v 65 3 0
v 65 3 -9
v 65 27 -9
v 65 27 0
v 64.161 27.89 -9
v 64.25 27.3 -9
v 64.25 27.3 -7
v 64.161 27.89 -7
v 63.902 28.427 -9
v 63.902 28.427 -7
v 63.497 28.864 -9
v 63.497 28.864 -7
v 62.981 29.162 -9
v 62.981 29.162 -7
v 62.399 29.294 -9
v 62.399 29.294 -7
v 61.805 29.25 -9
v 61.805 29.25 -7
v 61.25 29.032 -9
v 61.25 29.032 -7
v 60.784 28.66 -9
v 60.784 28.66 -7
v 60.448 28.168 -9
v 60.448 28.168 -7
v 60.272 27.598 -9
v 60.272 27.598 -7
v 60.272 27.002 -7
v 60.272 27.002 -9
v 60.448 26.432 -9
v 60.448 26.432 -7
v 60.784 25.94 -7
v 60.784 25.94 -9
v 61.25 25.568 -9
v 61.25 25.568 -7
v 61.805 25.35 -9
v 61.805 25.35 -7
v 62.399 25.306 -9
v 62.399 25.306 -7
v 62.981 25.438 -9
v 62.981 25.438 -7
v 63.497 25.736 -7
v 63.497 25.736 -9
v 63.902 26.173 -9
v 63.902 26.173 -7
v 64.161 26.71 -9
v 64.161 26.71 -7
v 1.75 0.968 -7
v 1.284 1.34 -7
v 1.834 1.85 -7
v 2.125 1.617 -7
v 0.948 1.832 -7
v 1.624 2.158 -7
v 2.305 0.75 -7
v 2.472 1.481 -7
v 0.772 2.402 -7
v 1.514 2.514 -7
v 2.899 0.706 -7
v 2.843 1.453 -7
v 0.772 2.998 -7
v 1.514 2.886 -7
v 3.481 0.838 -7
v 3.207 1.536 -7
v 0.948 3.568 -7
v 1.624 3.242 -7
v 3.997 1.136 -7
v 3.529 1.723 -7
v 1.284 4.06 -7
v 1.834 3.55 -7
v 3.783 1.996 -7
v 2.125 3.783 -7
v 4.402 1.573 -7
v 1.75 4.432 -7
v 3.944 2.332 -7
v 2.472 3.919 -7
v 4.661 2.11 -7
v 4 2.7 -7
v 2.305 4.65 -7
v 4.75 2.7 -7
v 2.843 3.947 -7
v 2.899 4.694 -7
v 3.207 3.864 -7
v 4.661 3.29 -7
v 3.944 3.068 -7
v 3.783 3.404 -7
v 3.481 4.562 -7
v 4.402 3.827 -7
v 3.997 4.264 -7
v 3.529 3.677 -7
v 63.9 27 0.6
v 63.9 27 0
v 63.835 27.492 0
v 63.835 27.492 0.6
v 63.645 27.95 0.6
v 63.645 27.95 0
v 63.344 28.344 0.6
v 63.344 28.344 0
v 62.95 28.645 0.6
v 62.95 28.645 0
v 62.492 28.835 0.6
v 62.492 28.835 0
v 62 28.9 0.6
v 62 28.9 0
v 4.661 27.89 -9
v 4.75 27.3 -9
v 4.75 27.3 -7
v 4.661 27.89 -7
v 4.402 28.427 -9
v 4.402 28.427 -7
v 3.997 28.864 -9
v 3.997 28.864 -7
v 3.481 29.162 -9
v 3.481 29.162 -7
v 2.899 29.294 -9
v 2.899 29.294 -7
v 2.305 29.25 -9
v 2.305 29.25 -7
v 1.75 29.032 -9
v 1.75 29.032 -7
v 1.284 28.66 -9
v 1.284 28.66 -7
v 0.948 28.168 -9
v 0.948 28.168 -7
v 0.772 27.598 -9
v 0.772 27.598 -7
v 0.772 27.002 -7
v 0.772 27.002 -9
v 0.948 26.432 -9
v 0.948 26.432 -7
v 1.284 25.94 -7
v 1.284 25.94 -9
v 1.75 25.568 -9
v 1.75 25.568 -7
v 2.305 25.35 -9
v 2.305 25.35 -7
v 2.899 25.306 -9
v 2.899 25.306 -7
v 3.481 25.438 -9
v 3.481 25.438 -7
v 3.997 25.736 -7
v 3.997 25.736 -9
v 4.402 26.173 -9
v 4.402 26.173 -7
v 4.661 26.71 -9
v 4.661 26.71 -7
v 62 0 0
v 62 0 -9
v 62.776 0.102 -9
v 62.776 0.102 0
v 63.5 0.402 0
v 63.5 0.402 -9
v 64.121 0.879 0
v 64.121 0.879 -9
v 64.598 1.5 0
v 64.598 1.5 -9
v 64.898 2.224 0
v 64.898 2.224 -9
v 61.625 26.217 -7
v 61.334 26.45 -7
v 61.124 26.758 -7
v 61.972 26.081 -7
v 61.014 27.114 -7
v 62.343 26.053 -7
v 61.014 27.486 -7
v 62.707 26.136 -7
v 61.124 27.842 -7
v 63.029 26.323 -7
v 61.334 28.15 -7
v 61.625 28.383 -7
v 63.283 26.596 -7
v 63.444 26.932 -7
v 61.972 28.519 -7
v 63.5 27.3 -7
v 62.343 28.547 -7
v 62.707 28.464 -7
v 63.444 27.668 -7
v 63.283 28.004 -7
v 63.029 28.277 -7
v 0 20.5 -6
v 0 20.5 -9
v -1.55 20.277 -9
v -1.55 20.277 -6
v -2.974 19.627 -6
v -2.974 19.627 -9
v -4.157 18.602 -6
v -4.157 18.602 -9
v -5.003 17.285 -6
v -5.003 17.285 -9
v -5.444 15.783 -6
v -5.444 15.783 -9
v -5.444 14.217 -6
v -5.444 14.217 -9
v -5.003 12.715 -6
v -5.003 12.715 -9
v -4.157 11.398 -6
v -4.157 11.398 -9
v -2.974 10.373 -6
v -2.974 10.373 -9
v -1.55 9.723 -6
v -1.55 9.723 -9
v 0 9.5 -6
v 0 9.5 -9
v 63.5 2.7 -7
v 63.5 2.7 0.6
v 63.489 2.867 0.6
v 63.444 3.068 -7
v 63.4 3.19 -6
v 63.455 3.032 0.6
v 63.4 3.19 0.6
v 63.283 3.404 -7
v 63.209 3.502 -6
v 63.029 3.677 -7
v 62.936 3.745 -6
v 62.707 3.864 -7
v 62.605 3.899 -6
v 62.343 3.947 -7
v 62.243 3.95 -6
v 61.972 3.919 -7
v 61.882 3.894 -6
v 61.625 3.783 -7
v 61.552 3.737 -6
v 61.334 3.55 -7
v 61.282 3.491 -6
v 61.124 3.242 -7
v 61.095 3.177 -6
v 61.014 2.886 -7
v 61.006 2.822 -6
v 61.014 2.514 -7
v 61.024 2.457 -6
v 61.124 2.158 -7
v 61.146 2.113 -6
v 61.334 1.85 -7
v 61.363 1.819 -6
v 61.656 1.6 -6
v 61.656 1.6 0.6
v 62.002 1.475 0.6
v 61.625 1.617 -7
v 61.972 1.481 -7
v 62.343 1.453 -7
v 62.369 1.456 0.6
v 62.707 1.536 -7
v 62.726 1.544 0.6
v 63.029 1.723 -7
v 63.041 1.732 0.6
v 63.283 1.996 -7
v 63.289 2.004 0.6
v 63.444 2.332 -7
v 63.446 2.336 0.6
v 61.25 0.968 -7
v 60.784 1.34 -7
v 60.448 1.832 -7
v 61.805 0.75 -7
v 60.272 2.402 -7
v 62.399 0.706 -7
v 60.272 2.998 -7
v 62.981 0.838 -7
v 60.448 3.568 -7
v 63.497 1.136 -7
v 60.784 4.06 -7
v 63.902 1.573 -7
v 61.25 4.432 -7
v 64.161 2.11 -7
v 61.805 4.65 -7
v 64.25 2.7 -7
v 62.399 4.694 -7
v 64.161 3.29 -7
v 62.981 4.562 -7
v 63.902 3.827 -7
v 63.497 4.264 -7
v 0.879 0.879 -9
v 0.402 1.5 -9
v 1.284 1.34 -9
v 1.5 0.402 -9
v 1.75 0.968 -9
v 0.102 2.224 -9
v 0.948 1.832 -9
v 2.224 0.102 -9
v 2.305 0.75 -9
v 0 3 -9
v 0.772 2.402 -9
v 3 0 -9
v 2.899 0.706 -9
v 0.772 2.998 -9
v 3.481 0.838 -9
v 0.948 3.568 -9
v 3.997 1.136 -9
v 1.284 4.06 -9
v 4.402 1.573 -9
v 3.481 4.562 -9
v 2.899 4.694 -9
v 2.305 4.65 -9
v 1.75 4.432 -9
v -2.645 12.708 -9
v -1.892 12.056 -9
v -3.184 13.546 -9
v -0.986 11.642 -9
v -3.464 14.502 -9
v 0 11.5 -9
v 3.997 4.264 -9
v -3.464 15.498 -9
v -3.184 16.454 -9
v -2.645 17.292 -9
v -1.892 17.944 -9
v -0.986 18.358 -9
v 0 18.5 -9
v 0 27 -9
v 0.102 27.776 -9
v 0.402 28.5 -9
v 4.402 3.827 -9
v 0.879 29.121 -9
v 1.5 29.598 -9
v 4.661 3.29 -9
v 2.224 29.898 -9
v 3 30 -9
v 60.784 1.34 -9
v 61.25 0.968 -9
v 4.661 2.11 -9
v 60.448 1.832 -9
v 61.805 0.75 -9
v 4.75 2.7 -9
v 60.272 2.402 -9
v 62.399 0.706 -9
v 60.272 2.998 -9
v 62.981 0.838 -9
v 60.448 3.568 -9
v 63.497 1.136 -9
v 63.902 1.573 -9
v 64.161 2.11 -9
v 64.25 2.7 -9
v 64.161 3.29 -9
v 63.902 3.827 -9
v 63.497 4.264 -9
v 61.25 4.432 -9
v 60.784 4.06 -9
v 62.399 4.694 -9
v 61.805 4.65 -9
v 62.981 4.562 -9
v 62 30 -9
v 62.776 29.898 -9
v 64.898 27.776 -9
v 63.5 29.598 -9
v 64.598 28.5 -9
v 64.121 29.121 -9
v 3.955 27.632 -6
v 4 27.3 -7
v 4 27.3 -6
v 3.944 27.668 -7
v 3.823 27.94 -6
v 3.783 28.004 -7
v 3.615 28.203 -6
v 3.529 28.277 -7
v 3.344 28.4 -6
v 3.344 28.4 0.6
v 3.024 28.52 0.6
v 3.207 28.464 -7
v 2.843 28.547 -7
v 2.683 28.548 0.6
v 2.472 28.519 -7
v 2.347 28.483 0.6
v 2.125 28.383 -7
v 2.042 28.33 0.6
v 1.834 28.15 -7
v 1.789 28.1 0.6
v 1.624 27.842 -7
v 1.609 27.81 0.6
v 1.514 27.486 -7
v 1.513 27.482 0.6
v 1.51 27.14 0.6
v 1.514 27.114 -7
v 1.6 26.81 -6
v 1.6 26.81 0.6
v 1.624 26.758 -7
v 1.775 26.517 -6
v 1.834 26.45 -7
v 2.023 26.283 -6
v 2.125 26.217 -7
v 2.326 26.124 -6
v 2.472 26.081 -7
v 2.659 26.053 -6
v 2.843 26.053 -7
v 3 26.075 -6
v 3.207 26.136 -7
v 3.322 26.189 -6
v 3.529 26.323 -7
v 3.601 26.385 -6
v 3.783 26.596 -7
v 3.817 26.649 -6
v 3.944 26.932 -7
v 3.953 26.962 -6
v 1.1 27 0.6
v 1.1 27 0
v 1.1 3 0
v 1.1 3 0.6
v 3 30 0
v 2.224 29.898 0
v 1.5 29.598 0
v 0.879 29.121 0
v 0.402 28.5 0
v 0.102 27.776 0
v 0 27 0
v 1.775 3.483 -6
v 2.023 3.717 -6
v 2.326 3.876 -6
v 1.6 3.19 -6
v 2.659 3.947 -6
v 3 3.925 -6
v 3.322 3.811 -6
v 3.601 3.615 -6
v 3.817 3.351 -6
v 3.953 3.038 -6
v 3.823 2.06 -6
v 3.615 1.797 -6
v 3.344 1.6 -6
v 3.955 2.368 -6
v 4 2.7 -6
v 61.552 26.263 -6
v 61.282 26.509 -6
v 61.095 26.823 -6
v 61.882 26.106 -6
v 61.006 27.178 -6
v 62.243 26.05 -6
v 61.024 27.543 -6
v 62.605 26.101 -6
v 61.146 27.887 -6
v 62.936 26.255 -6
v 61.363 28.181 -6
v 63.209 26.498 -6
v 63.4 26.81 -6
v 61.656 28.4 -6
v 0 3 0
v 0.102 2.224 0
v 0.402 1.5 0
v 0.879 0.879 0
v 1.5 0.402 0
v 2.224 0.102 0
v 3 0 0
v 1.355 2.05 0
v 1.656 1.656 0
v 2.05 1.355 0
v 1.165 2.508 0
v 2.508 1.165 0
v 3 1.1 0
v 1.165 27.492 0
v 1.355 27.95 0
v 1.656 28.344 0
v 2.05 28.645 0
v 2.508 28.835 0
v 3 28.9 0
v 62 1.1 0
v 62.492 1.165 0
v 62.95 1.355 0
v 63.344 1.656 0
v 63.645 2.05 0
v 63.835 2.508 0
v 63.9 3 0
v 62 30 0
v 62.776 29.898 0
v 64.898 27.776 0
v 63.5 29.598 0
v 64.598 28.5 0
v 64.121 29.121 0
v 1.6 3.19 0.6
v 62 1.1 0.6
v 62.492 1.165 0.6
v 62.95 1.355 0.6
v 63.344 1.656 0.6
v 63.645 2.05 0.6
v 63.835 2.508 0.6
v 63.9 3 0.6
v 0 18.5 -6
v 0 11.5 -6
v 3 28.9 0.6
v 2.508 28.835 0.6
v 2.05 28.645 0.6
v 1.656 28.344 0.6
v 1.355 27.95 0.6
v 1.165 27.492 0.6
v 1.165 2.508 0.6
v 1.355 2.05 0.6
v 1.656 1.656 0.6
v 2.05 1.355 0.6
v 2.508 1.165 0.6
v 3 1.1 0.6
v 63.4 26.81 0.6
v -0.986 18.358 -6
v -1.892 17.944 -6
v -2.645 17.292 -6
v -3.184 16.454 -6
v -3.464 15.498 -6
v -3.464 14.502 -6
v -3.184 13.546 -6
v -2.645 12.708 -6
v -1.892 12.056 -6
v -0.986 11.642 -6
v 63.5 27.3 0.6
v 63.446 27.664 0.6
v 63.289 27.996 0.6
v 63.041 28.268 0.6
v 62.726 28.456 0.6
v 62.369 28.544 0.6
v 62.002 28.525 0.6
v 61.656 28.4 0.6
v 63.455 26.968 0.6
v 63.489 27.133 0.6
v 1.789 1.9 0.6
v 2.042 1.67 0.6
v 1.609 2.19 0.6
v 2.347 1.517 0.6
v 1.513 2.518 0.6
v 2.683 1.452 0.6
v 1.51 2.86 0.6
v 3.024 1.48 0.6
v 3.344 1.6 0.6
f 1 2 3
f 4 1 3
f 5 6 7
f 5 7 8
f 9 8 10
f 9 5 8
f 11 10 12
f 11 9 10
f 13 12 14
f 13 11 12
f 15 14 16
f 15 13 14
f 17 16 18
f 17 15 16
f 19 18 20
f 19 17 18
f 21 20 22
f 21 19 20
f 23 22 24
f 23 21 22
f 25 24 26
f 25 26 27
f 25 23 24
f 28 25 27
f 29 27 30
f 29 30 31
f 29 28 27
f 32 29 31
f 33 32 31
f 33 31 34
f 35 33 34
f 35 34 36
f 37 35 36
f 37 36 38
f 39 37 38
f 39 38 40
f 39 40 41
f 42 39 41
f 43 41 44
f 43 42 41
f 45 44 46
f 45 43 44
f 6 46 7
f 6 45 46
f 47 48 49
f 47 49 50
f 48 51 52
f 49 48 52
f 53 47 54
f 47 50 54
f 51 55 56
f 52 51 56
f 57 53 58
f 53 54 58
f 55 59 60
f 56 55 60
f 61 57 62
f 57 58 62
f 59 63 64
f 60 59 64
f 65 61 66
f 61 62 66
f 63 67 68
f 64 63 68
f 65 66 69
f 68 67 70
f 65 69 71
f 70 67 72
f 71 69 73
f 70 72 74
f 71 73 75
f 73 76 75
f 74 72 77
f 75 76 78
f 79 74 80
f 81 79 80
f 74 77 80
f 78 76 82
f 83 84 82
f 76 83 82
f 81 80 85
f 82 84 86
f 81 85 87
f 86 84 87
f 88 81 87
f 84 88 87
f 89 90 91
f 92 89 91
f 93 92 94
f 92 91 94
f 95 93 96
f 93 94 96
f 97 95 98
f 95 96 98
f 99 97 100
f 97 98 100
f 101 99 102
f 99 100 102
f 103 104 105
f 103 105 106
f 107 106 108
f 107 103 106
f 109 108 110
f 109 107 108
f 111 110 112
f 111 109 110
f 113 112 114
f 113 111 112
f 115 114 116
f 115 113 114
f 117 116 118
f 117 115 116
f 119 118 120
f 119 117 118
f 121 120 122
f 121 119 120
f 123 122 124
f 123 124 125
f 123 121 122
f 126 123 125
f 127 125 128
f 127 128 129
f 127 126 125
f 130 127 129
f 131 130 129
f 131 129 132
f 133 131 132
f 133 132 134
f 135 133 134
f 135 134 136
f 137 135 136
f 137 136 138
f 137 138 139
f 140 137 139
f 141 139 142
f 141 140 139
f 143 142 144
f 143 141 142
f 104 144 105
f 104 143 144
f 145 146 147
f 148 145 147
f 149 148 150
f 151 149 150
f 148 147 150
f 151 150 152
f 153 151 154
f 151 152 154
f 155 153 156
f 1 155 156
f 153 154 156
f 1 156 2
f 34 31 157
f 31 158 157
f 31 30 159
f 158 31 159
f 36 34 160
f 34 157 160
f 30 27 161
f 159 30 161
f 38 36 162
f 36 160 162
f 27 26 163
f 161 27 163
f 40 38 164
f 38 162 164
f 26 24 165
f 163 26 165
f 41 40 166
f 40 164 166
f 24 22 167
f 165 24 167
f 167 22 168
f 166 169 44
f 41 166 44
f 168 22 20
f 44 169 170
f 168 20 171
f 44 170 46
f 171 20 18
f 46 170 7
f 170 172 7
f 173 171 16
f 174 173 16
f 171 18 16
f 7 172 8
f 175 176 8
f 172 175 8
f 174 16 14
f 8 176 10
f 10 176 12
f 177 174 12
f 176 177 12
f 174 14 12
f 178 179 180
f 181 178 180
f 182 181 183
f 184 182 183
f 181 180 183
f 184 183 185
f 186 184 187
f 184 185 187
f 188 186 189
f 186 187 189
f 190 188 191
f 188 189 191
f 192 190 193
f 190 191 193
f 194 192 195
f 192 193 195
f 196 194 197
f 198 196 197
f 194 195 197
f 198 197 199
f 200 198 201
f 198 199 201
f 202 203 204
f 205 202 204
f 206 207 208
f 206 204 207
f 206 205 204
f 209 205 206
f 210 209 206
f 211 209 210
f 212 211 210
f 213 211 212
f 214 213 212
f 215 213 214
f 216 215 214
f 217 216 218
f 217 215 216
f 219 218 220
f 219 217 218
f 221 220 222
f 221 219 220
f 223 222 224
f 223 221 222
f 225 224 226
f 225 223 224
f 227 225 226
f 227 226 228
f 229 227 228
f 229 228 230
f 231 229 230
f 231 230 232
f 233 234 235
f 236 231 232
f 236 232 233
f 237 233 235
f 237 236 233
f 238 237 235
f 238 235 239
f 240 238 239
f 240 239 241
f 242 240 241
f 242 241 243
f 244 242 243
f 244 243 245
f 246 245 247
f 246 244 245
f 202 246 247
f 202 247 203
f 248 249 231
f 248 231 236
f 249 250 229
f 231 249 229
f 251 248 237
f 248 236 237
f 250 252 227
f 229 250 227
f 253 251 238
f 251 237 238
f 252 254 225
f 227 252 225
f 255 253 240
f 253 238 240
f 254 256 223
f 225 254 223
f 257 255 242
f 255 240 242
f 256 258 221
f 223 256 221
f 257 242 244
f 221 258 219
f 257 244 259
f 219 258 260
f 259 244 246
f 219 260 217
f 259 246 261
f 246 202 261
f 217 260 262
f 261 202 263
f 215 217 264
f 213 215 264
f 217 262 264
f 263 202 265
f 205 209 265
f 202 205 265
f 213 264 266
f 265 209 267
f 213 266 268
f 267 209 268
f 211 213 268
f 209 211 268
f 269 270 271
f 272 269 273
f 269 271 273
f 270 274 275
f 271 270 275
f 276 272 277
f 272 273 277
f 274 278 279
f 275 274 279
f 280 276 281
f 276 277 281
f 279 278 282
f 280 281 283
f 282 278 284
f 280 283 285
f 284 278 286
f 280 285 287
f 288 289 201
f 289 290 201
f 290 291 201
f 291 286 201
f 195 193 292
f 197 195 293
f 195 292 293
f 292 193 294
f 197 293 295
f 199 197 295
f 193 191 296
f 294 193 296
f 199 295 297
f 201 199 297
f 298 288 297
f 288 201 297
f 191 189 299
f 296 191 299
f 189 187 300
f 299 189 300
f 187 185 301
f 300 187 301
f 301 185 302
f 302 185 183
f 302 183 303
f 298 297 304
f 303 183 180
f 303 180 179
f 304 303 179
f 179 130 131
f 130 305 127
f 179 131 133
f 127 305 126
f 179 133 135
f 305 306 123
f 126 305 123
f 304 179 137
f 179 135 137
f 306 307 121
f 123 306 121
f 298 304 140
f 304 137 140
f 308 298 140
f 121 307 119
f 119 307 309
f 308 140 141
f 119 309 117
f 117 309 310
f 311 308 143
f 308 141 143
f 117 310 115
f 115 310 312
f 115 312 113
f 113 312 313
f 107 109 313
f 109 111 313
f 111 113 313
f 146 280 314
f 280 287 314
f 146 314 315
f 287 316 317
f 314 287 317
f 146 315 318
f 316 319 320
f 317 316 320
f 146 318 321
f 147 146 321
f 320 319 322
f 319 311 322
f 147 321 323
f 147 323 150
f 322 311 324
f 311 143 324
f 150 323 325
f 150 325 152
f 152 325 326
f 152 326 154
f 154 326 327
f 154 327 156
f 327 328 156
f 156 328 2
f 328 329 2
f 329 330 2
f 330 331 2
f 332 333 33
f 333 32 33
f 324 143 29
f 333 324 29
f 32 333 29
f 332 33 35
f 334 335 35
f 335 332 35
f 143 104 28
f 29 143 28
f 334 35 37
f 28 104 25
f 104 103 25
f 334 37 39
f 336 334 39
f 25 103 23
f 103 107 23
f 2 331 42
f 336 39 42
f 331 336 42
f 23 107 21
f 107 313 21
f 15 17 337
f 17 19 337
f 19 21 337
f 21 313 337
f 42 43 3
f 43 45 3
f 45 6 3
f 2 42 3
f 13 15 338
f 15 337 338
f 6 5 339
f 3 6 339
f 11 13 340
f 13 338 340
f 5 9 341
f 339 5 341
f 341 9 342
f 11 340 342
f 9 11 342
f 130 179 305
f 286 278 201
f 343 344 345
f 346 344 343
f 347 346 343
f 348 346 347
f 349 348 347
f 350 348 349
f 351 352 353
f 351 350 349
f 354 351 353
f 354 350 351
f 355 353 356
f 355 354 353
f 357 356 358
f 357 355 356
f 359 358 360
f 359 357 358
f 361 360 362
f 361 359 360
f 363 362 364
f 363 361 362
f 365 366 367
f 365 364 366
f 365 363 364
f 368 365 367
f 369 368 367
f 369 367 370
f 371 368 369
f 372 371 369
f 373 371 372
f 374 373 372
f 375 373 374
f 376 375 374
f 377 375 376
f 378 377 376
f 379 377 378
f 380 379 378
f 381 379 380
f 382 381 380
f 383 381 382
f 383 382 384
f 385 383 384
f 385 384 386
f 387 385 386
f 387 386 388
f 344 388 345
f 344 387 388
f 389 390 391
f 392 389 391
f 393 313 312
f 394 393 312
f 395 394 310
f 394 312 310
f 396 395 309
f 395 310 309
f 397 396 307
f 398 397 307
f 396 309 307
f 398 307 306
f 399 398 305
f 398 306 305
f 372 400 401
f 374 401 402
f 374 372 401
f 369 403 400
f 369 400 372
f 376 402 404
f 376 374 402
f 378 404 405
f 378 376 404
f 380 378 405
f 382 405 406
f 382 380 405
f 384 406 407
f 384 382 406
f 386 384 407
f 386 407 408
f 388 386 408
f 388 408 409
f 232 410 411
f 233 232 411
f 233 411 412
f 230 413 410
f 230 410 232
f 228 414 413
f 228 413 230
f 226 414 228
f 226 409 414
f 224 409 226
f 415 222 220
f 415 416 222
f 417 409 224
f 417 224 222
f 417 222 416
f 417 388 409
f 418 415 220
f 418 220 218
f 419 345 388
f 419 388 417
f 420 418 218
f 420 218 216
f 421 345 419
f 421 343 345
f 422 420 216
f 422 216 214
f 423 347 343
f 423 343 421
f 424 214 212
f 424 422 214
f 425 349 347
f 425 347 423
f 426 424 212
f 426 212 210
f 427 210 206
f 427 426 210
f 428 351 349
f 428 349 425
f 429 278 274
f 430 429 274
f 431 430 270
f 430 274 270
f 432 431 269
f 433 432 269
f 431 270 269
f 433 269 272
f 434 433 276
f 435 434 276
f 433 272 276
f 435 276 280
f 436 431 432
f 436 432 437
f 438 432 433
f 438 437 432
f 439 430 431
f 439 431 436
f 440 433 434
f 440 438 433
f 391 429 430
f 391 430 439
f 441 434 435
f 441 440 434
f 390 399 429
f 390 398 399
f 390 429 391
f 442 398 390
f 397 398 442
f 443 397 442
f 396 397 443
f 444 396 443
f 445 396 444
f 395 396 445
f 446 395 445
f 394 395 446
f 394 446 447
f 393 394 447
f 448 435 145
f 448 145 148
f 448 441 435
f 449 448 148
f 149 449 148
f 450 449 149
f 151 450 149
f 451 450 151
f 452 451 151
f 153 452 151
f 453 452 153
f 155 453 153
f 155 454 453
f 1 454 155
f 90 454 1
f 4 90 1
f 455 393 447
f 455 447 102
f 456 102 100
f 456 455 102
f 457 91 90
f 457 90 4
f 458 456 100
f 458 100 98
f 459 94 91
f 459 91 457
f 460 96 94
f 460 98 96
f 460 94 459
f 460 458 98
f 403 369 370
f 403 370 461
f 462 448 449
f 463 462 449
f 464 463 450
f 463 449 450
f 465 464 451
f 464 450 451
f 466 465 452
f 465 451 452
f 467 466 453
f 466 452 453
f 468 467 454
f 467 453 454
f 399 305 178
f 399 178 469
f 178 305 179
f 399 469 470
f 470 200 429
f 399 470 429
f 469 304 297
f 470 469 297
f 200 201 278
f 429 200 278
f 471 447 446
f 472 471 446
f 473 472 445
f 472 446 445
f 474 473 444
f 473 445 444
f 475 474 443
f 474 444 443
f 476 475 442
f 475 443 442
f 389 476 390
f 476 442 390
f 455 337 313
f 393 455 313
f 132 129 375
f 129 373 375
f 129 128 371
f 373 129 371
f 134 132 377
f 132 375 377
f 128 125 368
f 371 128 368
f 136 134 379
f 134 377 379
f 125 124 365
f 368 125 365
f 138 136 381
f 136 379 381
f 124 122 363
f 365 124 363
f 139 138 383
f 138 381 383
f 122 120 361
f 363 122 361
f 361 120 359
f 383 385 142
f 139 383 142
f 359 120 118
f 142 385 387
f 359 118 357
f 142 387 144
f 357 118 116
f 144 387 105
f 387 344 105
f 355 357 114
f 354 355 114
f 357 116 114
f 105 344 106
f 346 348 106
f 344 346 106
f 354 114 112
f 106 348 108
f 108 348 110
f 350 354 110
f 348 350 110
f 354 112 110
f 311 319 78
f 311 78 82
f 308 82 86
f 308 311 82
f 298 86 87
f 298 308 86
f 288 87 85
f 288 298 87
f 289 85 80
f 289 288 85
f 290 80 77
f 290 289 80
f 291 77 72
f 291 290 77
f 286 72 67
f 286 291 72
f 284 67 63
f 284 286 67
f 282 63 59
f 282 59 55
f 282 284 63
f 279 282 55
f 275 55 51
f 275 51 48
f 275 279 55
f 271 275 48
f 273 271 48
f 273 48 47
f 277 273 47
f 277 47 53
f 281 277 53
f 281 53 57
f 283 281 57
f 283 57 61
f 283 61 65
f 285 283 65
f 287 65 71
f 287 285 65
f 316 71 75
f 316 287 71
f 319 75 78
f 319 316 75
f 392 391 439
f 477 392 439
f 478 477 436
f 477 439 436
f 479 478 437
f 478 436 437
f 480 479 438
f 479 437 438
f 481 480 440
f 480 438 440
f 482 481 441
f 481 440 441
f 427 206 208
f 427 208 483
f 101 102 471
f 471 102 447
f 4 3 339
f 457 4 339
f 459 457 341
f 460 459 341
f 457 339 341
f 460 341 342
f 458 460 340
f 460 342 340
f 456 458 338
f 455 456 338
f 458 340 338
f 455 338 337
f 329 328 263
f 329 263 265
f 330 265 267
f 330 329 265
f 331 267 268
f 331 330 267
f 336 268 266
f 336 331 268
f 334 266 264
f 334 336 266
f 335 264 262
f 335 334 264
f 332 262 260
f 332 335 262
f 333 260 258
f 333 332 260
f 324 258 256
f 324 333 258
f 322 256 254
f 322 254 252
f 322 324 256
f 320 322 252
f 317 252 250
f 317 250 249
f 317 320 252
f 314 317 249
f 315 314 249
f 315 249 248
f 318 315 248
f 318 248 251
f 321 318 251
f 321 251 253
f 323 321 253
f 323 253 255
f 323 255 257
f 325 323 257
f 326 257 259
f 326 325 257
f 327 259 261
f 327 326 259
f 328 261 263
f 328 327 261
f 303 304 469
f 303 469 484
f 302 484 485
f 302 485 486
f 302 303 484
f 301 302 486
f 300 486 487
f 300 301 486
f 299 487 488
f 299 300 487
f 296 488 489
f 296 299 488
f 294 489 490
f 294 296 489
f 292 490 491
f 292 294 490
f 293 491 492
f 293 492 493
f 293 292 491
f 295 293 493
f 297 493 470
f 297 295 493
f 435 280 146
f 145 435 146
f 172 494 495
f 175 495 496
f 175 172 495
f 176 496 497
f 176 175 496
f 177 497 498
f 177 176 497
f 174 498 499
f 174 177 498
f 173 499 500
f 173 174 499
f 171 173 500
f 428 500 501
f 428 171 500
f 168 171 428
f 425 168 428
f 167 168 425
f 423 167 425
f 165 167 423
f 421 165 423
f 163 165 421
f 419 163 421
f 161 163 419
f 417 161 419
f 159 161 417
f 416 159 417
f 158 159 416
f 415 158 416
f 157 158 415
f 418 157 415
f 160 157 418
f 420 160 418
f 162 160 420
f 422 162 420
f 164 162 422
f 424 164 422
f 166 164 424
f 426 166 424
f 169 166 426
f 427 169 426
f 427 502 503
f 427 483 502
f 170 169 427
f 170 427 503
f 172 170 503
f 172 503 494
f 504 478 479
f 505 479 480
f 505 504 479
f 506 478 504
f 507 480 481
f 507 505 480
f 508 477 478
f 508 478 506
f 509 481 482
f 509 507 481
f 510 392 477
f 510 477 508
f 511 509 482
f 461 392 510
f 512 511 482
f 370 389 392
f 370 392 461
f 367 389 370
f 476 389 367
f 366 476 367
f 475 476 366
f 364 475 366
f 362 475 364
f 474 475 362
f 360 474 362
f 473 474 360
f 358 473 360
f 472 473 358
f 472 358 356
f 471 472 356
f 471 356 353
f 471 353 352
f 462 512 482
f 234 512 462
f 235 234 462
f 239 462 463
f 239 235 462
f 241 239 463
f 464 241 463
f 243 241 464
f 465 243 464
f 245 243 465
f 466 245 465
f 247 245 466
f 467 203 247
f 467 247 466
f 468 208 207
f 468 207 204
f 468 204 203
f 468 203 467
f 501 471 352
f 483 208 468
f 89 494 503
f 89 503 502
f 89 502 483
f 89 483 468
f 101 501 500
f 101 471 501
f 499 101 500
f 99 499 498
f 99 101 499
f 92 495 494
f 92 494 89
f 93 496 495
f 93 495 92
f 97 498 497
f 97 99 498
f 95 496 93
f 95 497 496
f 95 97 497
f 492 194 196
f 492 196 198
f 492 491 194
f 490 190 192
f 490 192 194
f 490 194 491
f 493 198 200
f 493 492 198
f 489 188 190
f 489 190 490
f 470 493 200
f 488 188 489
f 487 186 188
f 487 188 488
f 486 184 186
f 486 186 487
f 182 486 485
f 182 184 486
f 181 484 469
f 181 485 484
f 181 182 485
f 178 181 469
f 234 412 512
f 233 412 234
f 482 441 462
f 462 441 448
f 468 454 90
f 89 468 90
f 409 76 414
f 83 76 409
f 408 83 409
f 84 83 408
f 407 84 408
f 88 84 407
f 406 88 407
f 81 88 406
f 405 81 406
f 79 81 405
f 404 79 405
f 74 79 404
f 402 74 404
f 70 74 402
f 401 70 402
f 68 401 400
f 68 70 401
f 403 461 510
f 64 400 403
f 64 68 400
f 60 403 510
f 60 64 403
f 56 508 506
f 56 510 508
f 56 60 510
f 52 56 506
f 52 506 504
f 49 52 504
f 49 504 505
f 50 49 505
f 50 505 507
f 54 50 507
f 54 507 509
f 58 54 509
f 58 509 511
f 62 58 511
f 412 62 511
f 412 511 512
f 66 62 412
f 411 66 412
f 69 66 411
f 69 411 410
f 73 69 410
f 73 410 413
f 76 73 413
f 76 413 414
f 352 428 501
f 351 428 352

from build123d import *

# Parameters (mm, degrees)
PAD002_DEPTH    = 9
POCKET002_DEPTH = 6
PAD003_DEPTH    = 0.6
SKETCH007_R     = 2
POCKET003_DEPTH = 2
SKETCH008_R     = 1.25
POCKET004_DEPTH = 10
PAD004_DEPTH    = 3


with BuildPart() as part:
    # Sketch004 → Pad002 (new body)
    with BuildSketch(Plane.XY):
        with BuildLine():
            Line((0, 27), (0, 3))
            ThreePointArc((0, 3), (0.87868, 0.87868), (3, 0))
            Line((3, 0), (62, 0))
            ThreePointArc((62, 0), (64.12132, 0.87868), (65, 3))
            Line((65, 3), (65, 27))
            ThreePointArc((65, 27), (64.12132, 29.12132), (62, 30))
            Line((62, 30), (3, 30))
            ThreePointArc((3, 30), (0.87868, 29.12132), (0, 27))
        make_face()
    extrude(amount=PAD002_DEPTH)

    # Sketch005 → Pocket002 (cut)
    with BuildSketch(Plane.XY.offset(9)):
        with BuildLine():
            Line((1.6, 27), (1.6, 3))
            ThreePointArc((1.6, 3), (2.010051, 2.010051), (3, 1.6))
            Line((3, 1.6), (62, 1.6))
            ThreePointArc((62, 1.6), (62.989949, 2.010051), (63.4, 3))
            Line((63.4, 3), (63.4, 27))
            ThreePointArc((63.4, 27), (62.989949, 27.989949), (62, 28.4))
            Line((62, 28.4), (3, 28.4))
            ThreePointArc((3, 28.4), (2.010051, 27.989949), (1.6, 27))
        make_face()
    extrude(amount=-POCKET002_DEPTH, mode=Mode.SUBTRACT)

    # Sketch006 → Pad003 (join)
    with BuildSketch(Plane.XY.offset(9)):
        with BuildLine():
            Line((1.1, 27), (1.1, 3))
            ThreePointArc((1.1, 3), (1.656497, 1.656497), (3, 1.1))
            Line((3, 1.1), (62, 1.1))
            ThreePointArc((62, 1.1), (63.343503, 1.656497), (63.9, 3))
            Line((63.9, 3), (63.9, 27))
            ThreePointArc((63.9, 27), (63.343503, 28.343503), (62, 28.9))
            Line((62, 28.9), (3, 28.9))
            ThreePointArc((3, 28.9), (1.656497, 28.343503), (1.1, 27))
        make_face()
        with BuildLine():
            Line((1.6, 27), (1.6, 3))
            ThreePointArc((1.6, 3), (2.010051, 2.010051), (3, 1.6))
            Line((3, 1.6), (62, 1.6))
            ThreePointArc((62, 1.6), (62.989949, 2.010051), (63.4, 3))
            Line((63.4, 3), (63.4, 27))
            ThreePointArc((63.4, 27), (62.989949, 27.989949), (62, 28.4))
            Line((62, 28.4), (3, 28.4))
            ThreePointArc((3, 28.4), (2.010051, 27.989949), (1.6, 27))
        make_face(mode=Mode.SUBTRACT)
    extrude(amount=PAD003_DEPTH)

    # Sketch007 → Pocket003 (cut)
    with BuildSketch(Plane.XY):
        with Locations((2.75, 27.3)):
            Circle(SKETCH007_R)
        with Locations((62.25, 27.3)):
            Circle(SKETCH007_R)
        with Locations((62.25, 2.7)):
            Circle(SKETCH007_R)
        with Locations((2.75, 2.7)):
            Circle(SKETCH007_R)
    extrude(amount=POCKET003_DEPTH, mode=Mode.SUBTRACT)

    # Sketch008 → Pocket004 (cut)
    with BuildSketch(Plane.XY):
        with Locations((2.75, 27.3)):
            Circle(SKETCH008_R)
        with Locations((62.25, 27.3)):
            Circle(SKETCH008_R)
        with Locations((2.75, 2.7)):
            Circle(SKETCH008_R)
        with Locations((62.25, 2.7)):
            Circle(SKETCH008_R)
    extrude(amount=POCKET004_DEPTH, mode=Mode.SUBTRACT)

    # Sketch009 → Pad004 (join)
    with BuildSketch(Plane.XY):
        with BuildLine():
            ThreePointArc((0, 20.5), (-5.5, 15), (0, 9.5))
            Line((0, 11.5), (0, 9.5))
            ThreePointArc((0, 18.5), (-3.5, 15), (0, 11.5))
            Line((0, 20.5), (0, 18.5))
        make_face()
    extrude(amount=PAD004_DEPTH)


with BuildPart() as part_1:
    # Body001 placement: moved
    add(part.part.moved(Location((0, 0, -9))))


solid = part_1.part
